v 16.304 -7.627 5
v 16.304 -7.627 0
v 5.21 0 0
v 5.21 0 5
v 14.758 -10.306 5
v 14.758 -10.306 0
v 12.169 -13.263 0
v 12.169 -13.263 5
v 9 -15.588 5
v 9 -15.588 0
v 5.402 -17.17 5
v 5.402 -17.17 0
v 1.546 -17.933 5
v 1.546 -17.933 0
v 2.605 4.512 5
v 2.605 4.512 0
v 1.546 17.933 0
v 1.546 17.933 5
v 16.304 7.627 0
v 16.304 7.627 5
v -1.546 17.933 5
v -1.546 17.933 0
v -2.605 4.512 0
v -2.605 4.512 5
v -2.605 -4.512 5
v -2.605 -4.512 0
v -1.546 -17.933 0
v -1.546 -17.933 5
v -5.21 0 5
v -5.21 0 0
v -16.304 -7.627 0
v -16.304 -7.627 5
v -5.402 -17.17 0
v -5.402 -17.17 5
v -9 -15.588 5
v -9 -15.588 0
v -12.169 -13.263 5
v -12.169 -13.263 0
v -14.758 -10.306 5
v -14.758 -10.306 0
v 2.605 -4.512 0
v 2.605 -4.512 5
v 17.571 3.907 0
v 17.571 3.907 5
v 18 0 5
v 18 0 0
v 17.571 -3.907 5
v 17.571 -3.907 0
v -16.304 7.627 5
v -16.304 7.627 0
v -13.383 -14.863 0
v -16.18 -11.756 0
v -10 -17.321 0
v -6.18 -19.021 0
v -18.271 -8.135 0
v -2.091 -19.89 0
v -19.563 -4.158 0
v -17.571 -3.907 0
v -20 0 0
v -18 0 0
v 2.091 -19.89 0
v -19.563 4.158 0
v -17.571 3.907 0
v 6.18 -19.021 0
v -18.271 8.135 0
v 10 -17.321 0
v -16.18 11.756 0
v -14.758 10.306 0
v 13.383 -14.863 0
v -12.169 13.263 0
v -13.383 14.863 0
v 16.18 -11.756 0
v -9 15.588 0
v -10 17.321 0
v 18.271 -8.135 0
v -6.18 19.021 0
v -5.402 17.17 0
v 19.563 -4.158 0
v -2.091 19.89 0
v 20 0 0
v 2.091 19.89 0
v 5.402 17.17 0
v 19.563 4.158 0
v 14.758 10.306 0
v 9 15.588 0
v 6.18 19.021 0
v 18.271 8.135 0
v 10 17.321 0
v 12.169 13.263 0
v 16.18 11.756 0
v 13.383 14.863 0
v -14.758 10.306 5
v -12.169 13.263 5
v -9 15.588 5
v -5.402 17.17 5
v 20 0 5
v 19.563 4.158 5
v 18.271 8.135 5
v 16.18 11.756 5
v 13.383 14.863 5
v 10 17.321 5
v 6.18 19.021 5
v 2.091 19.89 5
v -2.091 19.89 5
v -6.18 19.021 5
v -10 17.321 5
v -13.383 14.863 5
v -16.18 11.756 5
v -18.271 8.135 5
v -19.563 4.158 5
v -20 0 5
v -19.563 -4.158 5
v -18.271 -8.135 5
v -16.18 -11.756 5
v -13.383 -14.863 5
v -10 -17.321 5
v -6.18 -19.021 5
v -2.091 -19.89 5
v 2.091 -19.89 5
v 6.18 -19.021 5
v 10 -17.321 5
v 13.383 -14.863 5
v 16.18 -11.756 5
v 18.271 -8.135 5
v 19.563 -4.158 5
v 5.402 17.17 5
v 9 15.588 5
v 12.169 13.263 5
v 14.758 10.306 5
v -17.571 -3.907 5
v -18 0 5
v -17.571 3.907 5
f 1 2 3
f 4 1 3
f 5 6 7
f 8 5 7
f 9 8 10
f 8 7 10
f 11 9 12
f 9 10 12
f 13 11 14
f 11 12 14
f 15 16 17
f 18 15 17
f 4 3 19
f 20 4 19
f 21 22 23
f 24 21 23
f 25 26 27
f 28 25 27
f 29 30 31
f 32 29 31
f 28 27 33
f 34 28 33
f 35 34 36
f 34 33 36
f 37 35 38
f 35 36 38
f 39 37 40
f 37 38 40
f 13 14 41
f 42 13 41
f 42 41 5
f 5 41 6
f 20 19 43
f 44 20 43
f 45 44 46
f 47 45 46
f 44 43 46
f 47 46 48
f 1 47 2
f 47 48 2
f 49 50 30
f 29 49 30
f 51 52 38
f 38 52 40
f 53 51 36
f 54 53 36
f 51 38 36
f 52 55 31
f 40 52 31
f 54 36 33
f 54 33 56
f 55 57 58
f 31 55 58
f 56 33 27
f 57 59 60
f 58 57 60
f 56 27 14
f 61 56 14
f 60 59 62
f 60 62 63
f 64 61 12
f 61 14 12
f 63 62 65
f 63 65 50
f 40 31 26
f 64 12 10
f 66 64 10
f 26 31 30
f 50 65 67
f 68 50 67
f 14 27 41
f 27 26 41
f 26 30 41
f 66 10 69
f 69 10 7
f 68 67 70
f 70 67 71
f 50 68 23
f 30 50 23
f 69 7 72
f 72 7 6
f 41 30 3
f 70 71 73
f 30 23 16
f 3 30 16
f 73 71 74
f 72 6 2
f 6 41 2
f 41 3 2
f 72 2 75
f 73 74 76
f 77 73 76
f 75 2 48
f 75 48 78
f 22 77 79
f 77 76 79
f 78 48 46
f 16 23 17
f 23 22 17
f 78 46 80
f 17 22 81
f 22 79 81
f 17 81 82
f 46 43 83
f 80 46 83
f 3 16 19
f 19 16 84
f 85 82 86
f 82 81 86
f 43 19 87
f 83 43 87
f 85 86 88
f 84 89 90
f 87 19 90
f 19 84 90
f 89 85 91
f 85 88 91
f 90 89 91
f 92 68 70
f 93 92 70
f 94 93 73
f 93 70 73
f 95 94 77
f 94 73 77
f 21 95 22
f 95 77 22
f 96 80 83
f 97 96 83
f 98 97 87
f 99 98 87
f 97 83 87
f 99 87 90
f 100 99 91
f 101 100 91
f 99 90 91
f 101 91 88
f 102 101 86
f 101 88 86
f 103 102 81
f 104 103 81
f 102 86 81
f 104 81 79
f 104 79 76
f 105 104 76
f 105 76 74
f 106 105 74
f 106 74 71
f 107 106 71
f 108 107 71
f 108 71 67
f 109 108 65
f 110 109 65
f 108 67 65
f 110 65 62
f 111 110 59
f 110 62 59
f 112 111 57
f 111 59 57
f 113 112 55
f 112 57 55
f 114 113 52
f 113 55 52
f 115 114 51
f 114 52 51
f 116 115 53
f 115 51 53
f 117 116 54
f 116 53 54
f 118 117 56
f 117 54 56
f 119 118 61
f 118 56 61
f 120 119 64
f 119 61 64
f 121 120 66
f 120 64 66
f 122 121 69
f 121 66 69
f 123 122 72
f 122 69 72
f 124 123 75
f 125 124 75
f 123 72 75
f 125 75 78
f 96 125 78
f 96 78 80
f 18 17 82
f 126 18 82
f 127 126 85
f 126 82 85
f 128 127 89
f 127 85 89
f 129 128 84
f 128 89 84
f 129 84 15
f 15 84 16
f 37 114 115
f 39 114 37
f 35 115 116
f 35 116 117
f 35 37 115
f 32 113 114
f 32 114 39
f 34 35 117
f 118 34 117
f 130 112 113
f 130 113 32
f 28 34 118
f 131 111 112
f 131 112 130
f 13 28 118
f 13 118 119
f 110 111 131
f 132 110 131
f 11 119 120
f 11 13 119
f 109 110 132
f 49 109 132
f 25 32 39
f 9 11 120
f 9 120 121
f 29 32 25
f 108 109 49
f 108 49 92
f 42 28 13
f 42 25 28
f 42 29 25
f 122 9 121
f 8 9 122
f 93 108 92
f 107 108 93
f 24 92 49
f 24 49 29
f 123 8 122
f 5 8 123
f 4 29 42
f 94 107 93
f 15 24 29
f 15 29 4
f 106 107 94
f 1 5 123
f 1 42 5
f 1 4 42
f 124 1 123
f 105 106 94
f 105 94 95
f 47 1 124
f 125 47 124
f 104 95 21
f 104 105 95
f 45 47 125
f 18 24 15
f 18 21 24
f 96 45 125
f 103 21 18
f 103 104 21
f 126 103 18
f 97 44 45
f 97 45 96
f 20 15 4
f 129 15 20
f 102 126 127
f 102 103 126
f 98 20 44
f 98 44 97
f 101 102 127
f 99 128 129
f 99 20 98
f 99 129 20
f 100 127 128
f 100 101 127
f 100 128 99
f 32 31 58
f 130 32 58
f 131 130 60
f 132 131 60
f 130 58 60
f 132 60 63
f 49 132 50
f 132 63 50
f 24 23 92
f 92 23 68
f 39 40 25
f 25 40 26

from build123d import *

# Parameters (mm, degrees)
F0_R     = 20
F1_DEPTH = 5


with BuildPart() as f1:
    # F0 (on Top) → F1 (new body)
    with BuildSketch(Plane.XY):
        Circle(F0_R)
        with BuildLine():
            Line((-14.757616, -10.305958), (-2.605141, -4.512237))
            Line((-2.605141, -4.512237), (-1.546413, -17.933449))
            ThreePointArc((-1.546413, -17.933449), (-9, -15.588457), (-14.757616, -10.305958))
        make_face(mode=Mode.SUBTRACT)
        with BuildLine():
            Line((1.546413, -17.933449), (2.605141, -4.512237))
            Line((2.605141, -4.512237), (14.757616, -10.305958))
            ThreePointArc((14.757616, -10.305958), (9, -15.588457), (1.546413, -17.933449))
        make_face(mode=Mode.SUBTRACT)
        with BuildLine():
            Line((16.304029, -7.627492), (5.210282, 0))
            Line((5.210282, 0), (16.304029, 7.627492))
            ThreePointArc((16.304029, 7.627492), (18, 0), (16.304029, -7.627492))
        make_face(mode=Mode.SUBTRACT)
        with BuildLine():
            Line((-16.304029, 7.627492), (-5.210282, 0))
            Line((-5.210282, 0), (-16.304029, -7.627492))
            ThreePointArc((-16.304029, -7.627492), (-18, 0), (-16.304029, 7.627492))
        make_face(mode=Mode.SUBTRACT)
        with BuildLine():
            ThreePointArc((-14.757616, 10.305958), (-9, 15.588457), (-1.546413, 17.933449))
            Line((-1.546413, 17.933449), (-2.605141, 4.512237))
            Line((-2.605141, 4.512237), (-14.757616, 10.305958))
        make_face(mode=Mode.SUBTRACT)
        with BuildLine():
            Line((14.757616, 10.305958), (2.605141, 4.512237))
            Line((2.605141, 4.512237), (1.546413, 17.933449))
            ThreePointArc((1.546413, 17.933449), (9, 15.588457), (14.757616, 10.305958))
        make_face(mode=Mode.SUBTRACT)
    extrude(amount=F1_DEPTH)


solid = f1.part
